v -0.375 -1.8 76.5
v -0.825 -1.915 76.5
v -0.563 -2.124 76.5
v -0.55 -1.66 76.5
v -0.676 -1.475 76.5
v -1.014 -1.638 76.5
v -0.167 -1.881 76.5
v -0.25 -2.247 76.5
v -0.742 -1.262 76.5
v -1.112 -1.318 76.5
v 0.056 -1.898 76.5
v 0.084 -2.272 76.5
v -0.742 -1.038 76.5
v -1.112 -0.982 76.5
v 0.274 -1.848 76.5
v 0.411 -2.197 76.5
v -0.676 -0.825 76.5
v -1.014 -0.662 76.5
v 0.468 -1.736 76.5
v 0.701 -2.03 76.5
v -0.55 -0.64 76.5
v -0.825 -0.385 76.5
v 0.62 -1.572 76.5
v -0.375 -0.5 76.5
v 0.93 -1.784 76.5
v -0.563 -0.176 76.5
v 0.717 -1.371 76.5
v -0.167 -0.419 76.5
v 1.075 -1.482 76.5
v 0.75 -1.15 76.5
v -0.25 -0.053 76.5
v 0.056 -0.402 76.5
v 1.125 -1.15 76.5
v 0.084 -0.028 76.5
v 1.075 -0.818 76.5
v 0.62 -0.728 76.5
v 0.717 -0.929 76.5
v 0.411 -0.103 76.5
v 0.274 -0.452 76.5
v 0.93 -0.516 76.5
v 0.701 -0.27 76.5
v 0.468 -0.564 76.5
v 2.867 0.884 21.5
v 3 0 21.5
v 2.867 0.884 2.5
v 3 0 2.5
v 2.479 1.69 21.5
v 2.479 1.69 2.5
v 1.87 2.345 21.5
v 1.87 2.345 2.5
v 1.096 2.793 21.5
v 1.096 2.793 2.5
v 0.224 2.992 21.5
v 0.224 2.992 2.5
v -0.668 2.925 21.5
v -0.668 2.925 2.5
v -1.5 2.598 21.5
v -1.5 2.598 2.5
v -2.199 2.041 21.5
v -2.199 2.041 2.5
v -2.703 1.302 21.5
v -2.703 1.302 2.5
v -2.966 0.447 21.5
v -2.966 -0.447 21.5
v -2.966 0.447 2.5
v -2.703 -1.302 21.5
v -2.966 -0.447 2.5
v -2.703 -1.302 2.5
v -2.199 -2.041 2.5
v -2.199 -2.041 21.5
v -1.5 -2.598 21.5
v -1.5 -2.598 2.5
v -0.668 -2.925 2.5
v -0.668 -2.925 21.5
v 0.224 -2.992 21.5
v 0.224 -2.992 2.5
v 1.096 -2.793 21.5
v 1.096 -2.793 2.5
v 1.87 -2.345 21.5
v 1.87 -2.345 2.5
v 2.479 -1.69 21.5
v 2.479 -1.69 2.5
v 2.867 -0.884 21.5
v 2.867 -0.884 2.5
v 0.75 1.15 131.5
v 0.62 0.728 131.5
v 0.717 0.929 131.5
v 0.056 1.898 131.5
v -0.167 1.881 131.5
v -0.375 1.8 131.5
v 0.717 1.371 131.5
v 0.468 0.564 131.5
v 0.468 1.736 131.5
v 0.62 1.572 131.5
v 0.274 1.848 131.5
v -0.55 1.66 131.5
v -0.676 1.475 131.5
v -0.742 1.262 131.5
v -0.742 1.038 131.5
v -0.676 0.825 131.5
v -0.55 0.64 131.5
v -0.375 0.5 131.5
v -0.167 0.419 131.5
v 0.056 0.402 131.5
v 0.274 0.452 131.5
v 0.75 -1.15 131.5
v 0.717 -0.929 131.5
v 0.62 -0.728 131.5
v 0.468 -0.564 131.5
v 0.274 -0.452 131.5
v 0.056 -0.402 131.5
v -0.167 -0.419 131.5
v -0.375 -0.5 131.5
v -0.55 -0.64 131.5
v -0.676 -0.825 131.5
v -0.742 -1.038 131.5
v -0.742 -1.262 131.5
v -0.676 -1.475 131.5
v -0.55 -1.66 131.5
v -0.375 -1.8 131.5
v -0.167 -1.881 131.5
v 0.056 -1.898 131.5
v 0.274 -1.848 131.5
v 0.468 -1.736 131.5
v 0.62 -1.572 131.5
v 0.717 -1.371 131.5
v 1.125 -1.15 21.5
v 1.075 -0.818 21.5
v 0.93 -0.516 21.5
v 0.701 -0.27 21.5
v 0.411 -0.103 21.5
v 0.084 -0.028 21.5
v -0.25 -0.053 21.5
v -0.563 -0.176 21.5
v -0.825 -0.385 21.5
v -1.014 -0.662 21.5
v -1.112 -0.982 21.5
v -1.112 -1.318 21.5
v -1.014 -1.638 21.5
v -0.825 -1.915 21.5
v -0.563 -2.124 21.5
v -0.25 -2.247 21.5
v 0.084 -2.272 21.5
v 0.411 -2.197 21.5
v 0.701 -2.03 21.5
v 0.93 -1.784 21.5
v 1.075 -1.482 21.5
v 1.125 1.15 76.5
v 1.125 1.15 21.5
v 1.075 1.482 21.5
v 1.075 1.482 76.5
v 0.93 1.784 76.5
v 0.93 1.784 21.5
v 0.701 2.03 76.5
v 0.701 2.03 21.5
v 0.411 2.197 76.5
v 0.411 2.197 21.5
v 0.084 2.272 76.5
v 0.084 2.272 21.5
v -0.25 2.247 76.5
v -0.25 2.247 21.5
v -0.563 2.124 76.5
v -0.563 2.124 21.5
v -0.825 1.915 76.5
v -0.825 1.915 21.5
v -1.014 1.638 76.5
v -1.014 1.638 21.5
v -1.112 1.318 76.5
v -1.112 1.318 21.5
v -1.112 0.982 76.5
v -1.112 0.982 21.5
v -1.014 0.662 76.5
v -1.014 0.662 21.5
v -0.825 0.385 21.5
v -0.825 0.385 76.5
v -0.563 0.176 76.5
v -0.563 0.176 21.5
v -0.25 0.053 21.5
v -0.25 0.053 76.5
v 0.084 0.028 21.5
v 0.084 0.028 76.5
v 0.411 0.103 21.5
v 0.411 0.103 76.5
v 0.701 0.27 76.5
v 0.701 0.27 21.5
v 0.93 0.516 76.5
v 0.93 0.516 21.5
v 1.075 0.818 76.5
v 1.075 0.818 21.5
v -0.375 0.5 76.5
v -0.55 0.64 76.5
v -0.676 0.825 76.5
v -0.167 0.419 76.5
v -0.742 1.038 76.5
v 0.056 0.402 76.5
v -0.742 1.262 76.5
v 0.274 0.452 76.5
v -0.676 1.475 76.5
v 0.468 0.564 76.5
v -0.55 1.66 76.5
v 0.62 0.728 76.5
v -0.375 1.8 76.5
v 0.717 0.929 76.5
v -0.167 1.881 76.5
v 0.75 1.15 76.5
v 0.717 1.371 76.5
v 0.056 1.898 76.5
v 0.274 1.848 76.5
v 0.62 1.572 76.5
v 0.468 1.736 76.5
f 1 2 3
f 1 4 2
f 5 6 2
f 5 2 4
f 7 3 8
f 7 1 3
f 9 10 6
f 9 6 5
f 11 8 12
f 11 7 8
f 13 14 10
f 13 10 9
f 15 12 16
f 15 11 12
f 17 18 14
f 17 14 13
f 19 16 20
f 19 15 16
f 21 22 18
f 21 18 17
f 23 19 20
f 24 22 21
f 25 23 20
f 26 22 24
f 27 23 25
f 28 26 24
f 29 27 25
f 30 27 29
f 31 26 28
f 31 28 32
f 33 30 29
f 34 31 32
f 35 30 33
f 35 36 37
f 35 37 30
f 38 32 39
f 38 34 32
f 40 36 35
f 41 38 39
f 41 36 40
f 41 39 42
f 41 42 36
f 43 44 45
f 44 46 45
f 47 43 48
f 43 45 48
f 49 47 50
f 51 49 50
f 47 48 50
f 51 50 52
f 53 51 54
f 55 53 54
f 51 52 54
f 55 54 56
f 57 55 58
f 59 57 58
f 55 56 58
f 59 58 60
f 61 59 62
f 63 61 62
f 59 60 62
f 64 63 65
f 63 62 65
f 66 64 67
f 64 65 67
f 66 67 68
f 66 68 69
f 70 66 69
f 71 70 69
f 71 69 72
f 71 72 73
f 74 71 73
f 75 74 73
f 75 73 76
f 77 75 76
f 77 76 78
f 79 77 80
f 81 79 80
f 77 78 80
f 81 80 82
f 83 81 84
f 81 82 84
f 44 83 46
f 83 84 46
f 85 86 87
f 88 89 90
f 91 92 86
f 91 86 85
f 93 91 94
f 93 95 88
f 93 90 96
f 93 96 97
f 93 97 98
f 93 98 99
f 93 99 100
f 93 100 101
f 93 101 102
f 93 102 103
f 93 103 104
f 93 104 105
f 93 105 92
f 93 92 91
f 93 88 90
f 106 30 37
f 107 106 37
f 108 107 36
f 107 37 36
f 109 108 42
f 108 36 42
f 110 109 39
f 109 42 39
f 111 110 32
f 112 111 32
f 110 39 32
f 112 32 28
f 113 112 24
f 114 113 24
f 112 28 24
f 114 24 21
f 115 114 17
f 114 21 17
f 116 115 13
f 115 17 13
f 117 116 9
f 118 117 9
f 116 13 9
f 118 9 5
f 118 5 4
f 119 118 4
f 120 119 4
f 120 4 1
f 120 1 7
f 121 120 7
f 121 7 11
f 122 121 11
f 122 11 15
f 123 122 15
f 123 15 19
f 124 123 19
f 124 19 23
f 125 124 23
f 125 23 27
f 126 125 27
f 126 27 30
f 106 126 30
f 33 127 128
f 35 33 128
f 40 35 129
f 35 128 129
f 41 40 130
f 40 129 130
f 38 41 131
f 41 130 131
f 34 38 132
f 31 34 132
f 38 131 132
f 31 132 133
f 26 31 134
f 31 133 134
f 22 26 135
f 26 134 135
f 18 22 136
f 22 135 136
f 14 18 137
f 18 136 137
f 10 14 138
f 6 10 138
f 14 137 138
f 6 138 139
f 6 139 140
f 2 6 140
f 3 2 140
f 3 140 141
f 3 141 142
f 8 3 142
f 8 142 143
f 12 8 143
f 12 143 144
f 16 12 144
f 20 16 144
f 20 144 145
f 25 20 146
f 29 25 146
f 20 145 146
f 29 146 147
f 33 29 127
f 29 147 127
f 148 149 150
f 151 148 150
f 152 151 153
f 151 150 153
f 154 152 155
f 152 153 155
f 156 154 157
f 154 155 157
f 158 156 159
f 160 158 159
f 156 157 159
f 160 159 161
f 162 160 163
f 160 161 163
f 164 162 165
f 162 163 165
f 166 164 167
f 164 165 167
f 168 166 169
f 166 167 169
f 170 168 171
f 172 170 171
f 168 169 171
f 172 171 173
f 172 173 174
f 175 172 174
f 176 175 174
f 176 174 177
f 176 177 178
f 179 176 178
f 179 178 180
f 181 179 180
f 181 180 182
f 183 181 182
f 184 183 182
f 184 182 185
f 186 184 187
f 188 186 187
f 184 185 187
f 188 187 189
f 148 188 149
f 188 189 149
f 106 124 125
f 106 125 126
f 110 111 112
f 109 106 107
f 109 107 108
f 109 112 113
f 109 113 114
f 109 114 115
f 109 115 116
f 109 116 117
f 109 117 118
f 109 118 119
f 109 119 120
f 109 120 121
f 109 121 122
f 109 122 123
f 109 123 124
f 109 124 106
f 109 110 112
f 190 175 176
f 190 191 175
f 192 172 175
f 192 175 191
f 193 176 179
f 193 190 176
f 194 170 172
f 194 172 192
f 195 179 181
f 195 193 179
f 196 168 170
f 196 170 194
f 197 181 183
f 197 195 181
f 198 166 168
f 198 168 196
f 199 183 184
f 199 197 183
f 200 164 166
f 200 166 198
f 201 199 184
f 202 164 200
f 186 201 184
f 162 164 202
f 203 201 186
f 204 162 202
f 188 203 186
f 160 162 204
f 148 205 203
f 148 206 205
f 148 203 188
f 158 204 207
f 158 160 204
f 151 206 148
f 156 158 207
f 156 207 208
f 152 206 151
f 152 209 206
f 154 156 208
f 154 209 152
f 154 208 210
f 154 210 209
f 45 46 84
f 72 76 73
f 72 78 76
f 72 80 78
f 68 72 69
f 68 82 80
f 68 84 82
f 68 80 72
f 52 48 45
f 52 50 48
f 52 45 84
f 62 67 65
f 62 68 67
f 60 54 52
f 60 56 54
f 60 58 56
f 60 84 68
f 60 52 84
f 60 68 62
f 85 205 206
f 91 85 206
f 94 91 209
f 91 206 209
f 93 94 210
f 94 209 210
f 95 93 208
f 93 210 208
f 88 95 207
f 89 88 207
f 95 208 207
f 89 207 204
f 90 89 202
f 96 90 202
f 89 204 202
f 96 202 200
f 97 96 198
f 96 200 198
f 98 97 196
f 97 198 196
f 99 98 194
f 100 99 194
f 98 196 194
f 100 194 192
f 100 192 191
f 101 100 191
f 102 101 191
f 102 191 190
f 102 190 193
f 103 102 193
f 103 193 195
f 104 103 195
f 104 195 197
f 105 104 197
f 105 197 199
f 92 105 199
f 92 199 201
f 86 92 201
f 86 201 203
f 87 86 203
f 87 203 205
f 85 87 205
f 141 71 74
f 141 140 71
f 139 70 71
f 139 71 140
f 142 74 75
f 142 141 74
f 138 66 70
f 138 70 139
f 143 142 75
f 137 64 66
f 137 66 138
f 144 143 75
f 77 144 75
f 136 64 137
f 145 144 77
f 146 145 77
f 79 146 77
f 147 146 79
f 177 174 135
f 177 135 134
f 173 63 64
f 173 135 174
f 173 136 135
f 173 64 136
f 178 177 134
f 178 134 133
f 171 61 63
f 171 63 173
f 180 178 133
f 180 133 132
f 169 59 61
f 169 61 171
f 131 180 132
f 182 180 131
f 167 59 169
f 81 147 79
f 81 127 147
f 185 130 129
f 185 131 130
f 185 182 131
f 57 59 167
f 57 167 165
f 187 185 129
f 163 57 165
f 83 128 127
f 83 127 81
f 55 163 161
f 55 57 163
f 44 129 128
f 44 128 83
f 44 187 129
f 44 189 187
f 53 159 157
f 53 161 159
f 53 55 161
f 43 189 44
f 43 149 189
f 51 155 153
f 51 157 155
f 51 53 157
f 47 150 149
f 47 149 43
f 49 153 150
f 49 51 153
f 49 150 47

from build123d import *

# Parameters (mm, degrees)
CROQUIS1_R                   = 3
SALIENTE_EXTRUIR1_DEPTH      = 18
SALIENTE_EXTRUIR2_DEPTH      = 21.5
SALIENTE_EXTRUIR2_DEPTH_BACK = 1.5
CROQUIS1_2_R                 = 3
CROQUIS3_R                   = 3
CORTAR_EXTRUIR1_DEPTH        = 4
CROQUIS9_R                   = 1.125
SALIENTE_EXTRUIR3_DEPTH      = 55
CROQUIS10_R                  = 0.75
SALIENTE_EXTRUIR4_DEPTH      = 110


with BuildPart() as part:
    # Croquis1 → Saliente-Extruir1 (new body)
    with BuildSketch(Plane.XY):
        Circle(CROQUIS1_R)
    extrude(amount=SALIENTE_EXTRUIR1_DEPTH)

    # Croquis1<2> → Saliente-Extruir2 (add, two sides: drawn at the far end of the back side and taken through both)
    with BuildSketch(Plane.XY.offset(-SALIENTE_EXTRUIR2_DEPTH_BACK)):
        Circle(CROQUIS1_2_R)
    extrude(amount=SALIENTE_EXTRUIR2_DEPTH + SALIENTE_EXTRUIR2_DEPTH_BACK)

    # Croquis3 → Cortar-Extruir1 (cut)
    with BuildSketch(Plane(origin=(0, 0, -1.5), x_dir=(-1, 0, 0), z_dir=(0, 0, -1))):
        Circle(CROQUIS3_R)
    extrude(amount=-CORTAR_EXTRUIR1_DEPTH, mode=Mode.SUBTRACT)

    # Croquis9 → Saliente-Extruir3 (add)
    with BuildSketch(Plane.XY.offset(21.5)):
        with Locations((0, -1.15)):
            Circle(CROQUIS9_R)
        with Locations((0, 1.15)):
            Circle(CROQUIS9_R)
    extrude(amount=SALIENTE_EXTRUIR3_DEPTH)

    # Croquis10 → Saliente-Extruir4 (add)
    with BuildSketch(Plane.XY.offset(21.5)):
        with Locations((0, -1.15)):
            Circle(CROQUIS10_R)
        with Locations((0, 1.15)):
            Circle(CROQUIS10_R)
    extrude(amount=SALIENTE_EXTRUIR4_DEPTH)


solid = part.part
